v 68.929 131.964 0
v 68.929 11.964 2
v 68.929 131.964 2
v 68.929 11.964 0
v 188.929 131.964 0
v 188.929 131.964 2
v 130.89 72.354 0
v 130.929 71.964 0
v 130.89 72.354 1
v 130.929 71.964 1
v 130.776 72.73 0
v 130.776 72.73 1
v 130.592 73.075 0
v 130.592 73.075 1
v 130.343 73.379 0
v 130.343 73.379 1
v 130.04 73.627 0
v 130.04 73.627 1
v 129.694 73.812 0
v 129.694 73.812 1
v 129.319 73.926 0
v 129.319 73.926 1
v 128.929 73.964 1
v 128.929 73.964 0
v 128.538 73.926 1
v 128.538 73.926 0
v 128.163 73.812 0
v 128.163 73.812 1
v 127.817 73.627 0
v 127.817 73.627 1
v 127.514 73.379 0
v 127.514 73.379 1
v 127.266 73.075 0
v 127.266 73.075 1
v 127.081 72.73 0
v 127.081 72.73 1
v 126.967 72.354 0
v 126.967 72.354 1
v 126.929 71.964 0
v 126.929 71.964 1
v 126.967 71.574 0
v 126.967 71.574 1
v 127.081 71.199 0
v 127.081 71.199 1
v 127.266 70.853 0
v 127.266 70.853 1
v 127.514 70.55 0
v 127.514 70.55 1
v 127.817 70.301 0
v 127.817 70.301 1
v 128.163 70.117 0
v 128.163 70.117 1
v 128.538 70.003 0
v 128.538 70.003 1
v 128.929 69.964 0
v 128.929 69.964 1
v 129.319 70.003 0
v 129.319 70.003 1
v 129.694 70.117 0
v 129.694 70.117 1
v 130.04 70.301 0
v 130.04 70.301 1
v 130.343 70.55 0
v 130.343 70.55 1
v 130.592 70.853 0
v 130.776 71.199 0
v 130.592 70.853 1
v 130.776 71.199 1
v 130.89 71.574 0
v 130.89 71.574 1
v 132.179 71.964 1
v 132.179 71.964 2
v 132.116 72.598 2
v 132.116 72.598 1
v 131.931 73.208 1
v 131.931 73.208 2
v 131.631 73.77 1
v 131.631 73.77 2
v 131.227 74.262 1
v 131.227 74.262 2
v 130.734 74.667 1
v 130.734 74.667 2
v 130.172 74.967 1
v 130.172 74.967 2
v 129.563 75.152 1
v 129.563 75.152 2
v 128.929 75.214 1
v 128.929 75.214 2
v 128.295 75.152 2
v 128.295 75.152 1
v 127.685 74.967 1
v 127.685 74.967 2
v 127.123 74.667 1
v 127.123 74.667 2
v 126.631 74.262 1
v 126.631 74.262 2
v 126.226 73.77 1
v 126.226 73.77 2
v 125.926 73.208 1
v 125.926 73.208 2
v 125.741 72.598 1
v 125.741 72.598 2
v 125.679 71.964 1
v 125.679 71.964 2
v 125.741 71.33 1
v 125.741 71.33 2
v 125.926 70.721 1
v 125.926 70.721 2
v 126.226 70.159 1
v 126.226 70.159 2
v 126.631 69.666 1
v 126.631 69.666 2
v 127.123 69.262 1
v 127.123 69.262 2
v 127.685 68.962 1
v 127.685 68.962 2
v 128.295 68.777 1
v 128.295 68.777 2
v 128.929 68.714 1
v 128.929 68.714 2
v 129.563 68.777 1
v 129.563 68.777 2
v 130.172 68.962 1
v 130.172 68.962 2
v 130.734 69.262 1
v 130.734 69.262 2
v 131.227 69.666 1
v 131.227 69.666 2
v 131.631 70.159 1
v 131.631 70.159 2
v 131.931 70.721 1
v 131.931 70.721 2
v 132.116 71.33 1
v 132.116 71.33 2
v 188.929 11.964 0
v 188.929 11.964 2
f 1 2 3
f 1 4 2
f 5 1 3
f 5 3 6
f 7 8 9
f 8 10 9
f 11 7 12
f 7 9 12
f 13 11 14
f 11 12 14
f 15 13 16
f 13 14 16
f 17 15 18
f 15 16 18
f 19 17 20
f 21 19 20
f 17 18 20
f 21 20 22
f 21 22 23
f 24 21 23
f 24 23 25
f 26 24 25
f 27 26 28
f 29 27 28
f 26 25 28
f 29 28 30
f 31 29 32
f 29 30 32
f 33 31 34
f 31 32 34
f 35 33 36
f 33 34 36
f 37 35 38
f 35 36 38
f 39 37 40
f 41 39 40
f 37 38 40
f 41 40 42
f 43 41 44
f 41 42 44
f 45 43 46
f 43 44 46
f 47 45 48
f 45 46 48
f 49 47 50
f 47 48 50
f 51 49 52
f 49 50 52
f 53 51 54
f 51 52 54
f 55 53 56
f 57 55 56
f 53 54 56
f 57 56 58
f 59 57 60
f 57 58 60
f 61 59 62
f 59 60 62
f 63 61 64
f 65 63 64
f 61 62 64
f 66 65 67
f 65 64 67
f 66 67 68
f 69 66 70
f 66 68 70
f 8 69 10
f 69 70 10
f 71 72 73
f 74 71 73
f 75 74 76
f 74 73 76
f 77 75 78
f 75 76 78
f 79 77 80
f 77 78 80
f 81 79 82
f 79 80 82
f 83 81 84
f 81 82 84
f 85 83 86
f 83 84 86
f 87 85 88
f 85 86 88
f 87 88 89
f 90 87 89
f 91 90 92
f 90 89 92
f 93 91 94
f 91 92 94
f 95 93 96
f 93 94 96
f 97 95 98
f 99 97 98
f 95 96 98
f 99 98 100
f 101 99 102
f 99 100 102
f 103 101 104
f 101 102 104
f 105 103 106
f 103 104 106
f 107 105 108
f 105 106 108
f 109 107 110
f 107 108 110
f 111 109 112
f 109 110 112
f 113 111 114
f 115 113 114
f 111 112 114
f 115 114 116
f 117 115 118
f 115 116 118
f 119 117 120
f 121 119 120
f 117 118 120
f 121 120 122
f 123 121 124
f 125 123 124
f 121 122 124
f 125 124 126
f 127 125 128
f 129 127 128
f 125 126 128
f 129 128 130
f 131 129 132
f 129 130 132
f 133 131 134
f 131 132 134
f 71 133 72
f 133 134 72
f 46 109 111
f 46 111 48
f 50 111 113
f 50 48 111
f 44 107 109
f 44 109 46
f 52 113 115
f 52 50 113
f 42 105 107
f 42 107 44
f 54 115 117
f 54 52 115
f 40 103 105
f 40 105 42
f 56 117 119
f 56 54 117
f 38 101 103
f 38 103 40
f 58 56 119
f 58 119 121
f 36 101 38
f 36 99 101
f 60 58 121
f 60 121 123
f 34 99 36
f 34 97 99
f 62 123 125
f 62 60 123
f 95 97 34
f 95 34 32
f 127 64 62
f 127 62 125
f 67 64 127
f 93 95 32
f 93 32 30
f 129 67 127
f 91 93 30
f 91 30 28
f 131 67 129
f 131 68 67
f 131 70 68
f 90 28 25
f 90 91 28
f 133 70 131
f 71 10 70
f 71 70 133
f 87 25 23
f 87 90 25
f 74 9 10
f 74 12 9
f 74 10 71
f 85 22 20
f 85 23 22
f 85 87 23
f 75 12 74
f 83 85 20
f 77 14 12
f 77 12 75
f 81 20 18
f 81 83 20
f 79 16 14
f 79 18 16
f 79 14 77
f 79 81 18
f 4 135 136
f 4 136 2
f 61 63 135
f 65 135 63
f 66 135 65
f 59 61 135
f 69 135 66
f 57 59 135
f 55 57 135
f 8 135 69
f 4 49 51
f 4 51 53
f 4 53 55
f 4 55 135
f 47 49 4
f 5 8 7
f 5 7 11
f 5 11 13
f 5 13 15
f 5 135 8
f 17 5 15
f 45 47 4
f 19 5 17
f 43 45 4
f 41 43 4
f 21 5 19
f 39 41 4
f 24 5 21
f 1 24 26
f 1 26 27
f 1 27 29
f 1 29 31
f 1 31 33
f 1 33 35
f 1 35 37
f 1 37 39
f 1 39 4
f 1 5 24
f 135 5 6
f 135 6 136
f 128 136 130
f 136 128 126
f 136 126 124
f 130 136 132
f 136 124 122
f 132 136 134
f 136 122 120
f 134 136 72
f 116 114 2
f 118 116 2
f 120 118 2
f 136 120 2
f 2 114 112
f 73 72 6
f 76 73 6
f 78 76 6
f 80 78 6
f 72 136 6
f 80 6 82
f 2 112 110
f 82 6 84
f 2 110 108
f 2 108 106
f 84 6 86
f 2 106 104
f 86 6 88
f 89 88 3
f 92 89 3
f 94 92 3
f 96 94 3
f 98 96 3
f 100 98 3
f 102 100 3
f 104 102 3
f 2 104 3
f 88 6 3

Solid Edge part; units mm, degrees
sketch "Sketch1" plane through (0, 0, 0) normal (0, 0, 1) x (1, 0, 0)
  line L0 (68.9286, 131.9643) -> (188.9286, 131.9643)
  line L1 (188.9286, 131.9643) -> (188.9286, 11.9643)
  line L2 (188.9286, 11.9643) -> (68.9286, 11.9643)
  line L3 (68.9286, 11.9643) -> (68.9286, 131.9643)
  dimension "D1" = 120
  dimension "D2" = 120
  dimension "D3" = 120
extrude "Protrusion1" add sketch "Sketch1" along normal blind 2
sketch "Sketch2" plane through (128.9286, 71.9643, 2) normal (0, 0, 1) x (1, 0, 0)
  circle A0 centre (0, 0) radius 2
  dimension "D1" = 60
  dimension "D2" = 60
  dimension "D3" = 60
extrude "Cutout1" cut sketch "Sketch2" against normal through all
sketch "Sketch3" plane through (128.9286, 71.9643, 2) normal (0, 0, 1) x (1, 0, 0)
  circle A0 centre (0, 0) radius 3.25
extrude "ExtrudedCutout_3" cut sketch "Sketch3" against normal blind 1
